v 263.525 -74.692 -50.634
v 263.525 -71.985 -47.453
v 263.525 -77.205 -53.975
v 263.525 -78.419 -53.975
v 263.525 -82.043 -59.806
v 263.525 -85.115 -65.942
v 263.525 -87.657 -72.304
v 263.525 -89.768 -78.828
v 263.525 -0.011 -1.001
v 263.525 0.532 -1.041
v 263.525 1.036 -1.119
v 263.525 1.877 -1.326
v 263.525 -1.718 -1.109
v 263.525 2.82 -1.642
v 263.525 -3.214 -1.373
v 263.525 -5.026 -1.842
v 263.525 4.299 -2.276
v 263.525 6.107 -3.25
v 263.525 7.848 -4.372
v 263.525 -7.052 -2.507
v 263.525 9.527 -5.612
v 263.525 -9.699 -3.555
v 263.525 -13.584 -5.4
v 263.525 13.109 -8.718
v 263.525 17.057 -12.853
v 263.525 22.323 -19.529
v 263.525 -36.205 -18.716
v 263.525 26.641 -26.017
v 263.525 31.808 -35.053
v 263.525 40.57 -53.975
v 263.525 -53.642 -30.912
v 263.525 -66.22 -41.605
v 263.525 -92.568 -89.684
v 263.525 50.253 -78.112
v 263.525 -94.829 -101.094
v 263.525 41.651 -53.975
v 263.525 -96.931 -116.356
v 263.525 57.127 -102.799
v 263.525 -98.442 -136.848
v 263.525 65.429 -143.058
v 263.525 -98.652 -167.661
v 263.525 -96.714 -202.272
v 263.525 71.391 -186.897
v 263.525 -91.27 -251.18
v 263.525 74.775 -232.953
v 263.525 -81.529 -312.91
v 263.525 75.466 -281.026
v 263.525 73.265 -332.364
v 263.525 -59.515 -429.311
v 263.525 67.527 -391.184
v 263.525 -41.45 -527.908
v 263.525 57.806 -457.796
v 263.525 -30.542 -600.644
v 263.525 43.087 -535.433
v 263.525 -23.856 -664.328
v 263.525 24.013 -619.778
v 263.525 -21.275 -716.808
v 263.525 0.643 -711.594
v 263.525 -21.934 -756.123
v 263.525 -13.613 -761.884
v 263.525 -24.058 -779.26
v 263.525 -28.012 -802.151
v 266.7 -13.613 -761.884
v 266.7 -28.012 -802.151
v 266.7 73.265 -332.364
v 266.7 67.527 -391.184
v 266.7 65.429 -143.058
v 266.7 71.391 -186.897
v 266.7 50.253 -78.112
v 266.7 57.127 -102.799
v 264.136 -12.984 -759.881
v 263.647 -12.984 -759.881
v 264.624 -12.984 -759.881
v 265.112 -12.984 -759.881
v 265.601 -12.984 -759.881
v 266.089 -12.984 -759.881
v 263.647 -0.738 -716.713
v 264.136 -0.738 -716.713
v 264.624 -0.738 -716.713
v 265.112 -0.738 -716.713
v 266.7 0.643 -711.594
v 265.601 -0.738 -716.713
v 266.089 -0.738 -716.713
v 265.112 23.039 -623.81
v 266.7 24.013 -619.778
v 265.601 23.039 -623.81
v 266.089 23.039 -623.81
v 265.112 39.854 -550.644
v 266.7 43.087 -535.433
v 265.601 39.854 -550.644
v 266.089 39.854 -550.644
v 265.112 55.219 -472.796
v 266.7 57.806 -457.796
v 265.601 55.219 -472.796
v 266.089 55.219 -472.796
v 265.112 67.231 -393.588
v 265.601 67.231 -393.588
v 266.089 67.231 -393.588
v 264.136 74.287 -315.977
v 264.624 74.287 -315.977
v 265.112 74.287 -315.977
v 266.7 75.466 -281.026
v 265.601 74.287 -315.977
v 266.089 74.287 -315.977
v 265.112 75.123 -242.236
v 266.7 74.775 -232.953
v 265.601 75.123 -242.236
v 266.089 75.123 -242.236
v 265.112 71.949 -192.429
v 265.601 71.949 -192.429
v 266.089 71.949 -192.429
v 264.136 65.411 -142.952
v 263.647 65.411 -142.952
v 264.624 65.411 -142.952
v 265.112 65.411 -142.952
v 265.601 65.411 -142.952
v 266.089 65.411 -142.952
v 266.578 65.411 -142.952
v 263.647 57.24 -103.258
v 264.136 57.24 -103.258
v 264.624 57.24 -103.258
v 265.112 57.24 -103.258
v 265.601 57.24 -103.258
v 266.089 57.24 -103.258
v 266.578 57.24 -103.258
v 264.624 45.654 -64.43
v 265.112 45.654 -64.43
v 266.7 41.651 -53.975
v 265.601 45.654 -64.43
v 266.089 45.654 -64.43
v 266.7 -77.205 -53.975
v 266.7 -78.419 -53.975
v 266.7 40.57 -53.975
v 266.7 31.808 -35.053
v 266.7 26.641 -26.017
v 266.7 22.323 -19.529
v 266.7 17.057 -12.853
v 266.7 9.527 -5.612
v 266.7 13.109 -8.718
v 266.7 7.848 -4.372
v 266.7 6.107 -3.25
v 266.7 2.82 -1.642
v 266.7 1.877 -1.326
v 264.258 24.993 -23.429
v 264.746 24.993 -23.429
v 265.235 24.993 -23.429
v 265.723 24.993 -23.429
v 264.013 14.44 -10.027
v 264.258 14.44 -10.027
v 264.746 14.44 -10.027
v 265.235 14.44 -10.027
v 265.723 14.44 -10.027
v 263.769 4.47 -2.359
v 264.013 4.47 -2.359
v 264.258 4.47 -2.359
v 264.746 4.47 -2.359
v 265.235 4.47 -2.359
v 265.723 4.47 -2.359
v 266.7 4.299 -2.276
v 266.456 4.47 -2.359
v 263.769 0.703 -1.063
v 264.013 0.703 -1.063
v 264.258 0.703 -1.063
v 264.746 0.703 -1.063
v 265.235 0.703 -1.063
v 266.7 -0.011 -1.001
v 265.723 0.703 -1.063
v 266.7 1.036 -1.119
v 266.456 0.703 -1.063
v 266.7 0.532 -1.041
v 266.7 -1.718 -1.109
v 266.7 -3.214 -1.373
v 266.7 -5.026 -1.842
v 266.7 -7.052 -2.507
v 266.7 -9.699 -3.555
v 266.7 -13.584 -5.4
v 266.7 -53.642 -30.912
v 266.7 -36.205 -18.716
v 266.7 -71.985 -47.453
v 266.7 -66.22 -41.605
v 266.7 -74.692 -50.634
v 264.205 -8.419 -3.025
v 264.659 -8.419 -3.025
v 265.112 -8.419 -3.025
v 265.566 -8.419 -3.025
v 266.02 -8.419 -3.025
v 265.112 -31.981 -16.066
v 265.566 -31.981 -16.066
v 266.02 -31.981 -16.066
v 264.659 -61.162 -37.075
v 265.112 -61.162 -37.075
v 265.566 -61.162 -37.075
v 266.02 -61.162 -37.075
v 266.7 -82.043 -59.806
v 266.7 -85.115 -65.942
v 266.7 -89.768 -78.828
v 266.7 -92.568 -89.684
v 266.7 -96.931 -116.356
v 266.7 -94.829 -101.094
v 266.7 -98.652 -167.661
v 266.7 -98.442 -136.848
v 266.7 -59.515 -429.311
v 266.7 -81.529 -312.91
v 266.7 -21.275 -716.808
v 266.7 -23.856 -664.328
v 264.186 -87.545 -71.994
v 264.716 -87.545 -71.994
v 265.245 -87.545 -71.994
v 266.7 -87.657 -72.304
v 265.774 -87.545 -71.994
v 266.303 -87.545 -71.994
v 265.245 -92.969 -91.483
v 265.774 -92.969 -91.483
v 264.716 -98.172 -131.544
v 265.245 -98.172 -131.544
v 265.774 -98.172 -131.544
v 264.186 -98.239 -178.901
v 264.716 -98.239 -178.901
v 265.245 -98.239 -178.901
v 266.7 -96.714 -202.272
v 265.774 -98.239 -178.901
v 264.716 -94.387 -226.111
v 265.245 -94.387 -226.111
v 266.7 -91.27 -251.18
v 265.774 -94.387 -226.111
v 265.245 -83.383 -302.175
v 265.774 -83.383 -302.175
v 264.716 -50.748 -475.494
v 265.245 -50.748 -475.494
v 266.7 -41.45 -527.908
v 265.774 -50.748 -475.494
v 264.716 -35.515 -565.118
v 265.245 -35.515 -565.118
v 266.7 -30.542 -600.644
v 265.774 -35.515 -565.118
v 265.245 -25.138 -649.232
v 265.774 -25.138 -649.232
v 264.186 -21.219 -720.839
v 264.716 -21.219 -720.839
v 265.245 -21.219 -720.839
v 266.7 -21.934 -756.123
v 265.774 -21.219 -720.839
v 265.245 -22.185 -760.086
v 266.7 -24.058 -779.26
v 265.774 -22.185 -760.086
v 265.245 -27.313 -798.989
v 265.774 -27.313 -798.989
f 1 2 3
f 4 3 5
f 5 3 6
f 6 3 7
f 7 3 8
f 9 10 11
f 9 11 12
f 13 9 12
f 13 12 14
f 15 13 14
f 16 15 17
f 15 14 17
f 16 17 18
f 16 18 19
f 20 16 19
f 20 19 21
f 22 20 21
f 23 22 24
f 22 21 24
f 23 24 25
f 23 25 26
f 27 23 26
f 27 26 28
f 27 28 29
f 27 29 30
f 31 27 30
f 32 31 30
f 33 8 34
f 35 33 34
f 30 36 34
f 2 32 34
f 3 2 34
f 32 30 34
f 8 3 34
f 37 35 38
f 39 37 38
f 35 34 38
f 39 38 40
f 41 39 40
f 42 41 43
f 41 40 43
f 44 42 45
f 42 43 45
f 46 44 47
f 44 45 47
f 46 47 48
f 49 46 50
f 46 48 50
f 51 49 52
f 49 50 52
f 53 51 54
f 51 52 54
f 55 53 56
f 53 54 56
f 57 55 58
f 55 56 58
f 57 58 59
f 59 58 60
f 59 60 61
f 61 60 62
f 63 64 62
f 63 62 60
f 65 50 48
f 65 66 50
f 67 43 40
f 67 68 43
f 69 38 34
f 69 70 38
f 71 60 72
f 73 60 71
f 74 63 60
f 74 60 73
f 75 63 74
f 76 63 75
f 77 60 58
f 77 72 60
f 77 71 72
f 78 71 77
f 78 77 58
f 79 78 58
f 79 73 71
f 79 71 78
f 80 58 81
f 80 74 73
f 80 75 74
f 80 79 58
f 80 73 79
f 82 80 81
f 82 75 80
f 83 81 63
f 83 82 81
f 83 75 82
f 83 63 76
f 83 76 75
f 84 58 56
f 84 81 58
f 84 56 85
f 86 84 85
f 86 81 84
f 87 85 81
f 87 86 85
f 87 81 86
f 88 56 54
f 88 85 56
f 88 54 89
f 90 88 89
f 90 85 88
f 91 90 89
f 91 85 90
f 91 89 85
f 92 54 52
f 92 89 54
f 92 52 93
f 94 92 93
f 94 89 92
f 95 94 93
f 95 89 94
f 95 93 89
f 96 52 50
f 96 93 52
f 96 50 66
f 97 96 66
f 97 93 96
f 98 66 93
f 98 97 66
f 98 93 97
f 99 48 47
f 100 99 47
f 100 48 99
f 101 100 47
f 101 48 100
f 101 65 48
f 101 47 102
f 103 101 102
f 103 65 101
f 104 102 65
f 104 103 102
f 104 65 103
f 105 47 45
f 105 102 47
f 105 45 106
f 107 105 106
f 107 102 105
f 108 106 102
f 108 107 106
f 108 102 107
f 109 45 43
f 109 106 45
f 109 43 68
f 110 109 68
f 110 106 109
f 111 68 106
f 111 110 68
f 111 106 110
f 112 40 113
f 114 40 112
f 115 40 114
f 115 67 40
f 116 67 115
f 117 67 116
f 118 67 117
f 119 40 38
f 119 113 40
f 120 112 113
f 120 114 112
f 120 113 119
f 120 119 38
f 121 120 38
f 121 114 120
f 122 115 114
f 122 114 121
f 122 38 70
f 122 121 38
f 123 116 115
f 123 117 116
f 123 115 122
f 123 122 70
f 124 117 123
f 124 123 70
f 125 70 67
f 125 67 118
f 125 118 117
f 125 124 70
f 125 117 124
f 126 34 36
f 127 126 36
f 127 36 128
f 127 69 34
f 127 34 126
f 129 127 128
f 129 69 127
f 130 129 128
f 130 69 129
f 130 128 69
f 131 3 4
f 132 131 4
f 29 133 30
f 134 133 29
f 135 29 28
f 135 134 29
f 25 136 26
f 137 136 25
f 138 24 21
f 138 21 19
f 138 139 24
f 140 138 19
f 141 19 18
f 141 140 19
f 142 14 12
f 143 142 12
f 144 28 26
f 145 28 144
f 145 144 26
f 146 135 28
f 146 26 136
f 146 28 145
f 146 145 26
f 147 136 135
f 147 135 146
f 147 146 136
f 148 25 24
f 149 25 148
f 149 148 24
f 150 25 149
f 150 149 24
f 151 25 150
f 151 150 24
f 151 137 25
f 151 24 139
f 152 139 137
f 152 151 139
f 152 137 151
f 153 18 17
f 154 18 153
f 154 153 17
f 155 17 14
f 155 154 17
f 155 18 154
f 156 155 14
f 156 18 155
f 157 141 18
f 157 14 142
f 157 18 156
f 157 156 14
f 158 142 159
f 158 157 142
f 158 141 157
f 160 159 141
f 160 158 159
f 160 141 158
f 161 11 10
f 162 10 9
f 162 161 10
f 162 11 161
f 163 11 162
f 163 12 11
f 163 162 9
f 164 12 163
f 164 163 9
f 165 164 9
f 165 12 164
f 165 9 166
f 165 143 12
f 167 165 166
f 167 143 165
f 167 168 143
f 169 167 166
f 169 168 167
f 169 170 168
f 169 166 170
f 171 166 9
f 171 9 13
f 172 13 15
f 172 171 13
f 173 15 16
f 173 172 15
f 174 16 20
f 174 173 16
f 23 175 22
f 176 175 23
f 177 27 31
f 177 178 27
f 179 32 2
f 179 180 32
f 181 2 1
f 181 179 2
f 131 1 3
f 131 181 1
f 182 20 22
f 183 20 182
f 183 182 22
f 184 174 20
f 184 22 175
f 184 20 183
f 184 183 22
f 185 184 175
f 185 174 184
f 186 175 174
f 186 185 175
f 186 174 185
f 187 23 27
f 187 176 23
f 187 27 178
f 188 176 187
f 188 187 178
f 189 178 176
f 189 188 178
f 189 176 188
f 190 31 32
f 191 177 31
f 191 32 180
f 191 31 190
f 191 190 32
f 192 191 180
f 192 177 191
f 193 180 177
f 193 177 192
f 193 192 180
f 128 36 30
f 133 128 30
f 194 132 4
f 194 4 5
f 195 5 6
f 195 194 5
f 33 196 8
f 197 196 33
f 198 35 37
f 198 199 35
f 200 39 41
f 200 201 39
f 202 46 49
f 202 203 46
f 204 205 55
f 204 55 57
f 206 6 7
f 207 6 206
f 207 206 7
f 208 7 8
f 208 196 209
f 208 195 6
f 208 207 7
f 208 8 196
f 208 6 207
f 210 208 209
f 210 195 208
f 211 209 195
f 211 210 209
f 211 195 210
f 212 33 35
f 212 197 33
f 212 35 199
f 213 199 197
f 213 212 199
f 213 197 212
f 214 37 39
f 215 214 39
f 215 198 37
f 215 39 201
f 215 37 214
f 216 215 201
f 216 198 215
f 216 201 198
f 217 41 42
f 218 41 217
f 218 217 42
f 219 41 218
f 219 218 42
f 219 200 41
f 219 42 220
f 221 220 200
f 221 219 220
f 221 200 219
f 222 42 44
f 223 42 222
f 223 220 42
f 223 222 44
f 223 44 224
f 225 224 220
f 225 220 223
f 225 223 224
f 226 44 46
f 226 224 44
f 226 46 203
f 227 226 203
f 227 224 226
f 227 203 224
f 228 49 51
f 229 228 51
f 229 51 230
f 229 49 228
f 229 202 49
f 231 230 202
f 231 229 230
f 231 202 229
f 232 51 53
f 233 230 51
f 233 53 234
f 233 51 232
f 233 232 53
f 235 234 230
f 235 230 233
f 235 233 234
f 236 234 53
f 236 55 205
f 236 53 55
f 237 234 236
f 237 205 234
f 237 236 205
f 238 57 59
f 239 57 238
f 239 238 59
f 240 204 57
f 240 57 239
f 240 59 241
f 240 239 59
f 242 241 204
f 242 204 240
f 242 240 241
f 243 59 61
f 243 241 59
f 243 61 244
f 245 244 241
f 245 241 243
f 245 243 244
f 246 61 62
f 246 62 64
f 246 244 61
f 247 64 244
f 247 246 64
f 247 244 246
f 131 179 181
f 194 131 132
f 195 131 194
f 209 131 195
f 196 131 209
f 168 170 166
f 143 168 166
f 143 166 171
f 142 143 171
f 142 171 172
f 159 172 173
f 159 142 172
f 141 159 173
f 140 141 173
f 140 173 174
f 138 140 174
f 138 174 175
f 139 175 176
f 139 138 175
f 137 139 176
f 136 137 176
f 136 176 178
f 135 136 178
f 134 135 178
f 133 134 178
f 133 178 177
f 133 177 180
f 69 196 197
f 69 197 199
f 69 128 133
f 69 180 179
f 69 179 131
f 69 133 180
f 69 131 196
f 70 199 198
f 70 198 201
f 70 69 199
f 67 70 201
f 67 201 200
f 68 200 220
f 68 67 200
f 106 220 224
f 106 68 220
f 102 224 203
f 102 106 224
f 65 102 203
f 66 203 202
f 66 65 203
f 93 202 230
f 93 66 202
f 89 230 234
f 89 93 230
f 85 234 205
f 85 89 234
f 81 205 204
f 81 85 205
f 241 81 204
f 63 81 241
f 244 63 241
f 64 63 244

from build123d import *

# Parameters (mm, degrees)
BOSS_EXTRUDE2_DEPTH = 3.175


with BuildPart() as part:
    # Sketch2 → Boss-Extrude2 (new body)
    with BuildSketch(Plane(origin=(266.7, 0, 0), x_dir=(0, 0, -1), z_dir=(1, 0, 0))):
        with BuildLine():
            Line((53.975, -77.204508027), (53.975, -78.419412207))
            add(Edge.make_bspline(
                [(53.975, -78.419412207), (57.393939715, -80.776121472), (66.842733973, -86.13701714), (84.452765046, -91.717357185), (106.852134498, -96.151510734), (132.510932076, -98.572249175), (161.194365788, -99.092382868), (192.761343292, -97.704243711), (227.038217577, -94.511839296), (263.834756502, -89.663828123), (302.921473177, -83.388445028), (344.017776041, -75.977786804), (386.776799789, -67.780707382), (430.77461487, -59.202323955), (475.496263681, -50.66380512), (520.335279967, -42.603612471), (564.588870456, -35.422796347), (607.4709344, -29.473308084), (648.127538759, -25.014473383), (685.667615873, -22.186241782), (719.196759596, -21.00476141), (747.830287498, -21.278636312), (770.688405743, -22.854711922), (787.091395164, -25.07351564), (796.842303095, -26.819328187), (801.097715575, -27.775140745), (802.151053399, -28.011732033)],
                knots=[0.113056669, 0.113056669, 0.113056669, 0.113056669, 0.127599777, 0.150892793, 0.177565203, 0.207667777, 0.241222088, 0.278203414, 0.318526303, 0.362030579, 0.408464625, 0.457479062, 0.508614437, 0.561296015, 0.614835295, 0.668437534, 0.721214466, 0.772202341, 0.820393483, 0.864765923, 0.904323704, 0.938131581, 0.965241743, 0.984690447, 0.996210442, 1, 1, 1, 1], degree=3))
            add(Edge.make_bspline(
                [(802.151053399, -28.011732033), (801.137231832, -27.710542124), (797.278434829, -26.564156251), (789.357225956, -23.458600593), (777.06146068, -18.643579076), (760.581722214, -13.040064966), (739.99675031, -7.1233282), (715.577161881, -0.379813283), (687.646997389, 7.013021798), (656.683490083, 14.958443735), (623.15891656, 23.258345049), (587.549187868, 31.694376174), (550.31922689, 40.026159278), (511.914813655, 48.001625947), (472.761711337, 55.374538475), (433.262164148, 61.912775617), (393.795881302, 67.404801186), (354.719946084, 71.655180259), (316.356950184, 74.535698451), (278.931254814, 75.753587714), (242.69940893, 75.393823286), (207.870582877, 73.546655951), (174.746776105, 70.258980652), (143.601377813, 65.768183379), (114.762118239, 60.187460639), (88.534490153, 53.628471164), (68.561648347, 47.303164595), (57.431887436, 43.056839639), (53.975, 41.651039403)],
                knots=[0, 0, 0, 0, 0.003802345, 0.014472446, 0.030563625, 0.051299059, 0.07702847, 0.107573811, 0.142399413, 0.180921149, 0.22252468, 0.266590974, 0.312514686, 0.359710118, 0.407632337, 0.455773217, 0.503669018, 0.550900956, 0.597096183, 0.641976048, 0.685511898, 0.727353252, 0.767353583, 0.805169064, 0.840471252, 0.872937278, 0.902335209, 0.915751061, 0.915751061, 0.915751061, 0.915751061], degree=3))
            Line((53.975, 41.651039403), (53.975, 40.570467669))
            add(Edge.make_bspline(
                [(53.975, 40.570467669), (52.223886058, 39.855098624), (46.55545684, 37.466004168), (37.125856967, 33.052667662), (27.830126078, 27.881861429), (20.719091852, 23.242104552), (15.614495512, 19.455137028), (10.786663524, 15.322063664), (6.429543979, 10.752121577), (3.329781232, 6.520651809), (1.766394253, 3.289416468), (1.234579927, 1.629552357), (1.070917704, 0.808496148), (1.022680145, 0.373573872), (1.00777339, 0.114040658), (1.00092143, -0.010571576)],
                knots=[0.916241011, 0.916241011, 0.916241011, 0.916241011, 0.923068013, 0.938443772, 0.953819531, 0.961507411, 0.96919529, 0.97688317, 0.98457105, 0.992258929, 0.996102869, 0.998024839, 0.998985824, 0.999466316, 0.999946809, 0.999946809, 0.999946809, 0.999946809], degree=3))
            add(Edge.make_bspline(
                [(1.00092143, -0.010571576), (1.009923866, -0.277884036), (1.028927427, -0.823363497), (1.102768583, -1.825860344), (1.416760314, -3.597204949), (2.45215177, -7.203197251), (4.557690792, -12.131446446), (7.694252843, -17.87383852), (12.081452023, -25.466401501), (17.732189245, -34.79647061), (24.919919042, -45.768224894), (31.457640354, -54.481000173), (37.047635253, -61.18254607), (42.853610743, -67.720036372), (48.449554365, -73.119796986), (52.936471607, -76.472448044), (53.975, -77.204508027)],
                knots=[5.1727e-05, 5.1727e-05, 5.1727e-05, 5.1727e-05, 0.001013083, 0.00197444, 0.003897153, 0.007742579, 0.015433432, 0.023124285, 0.030815138, 0.046196844, 0.06157855, 0.076960256, 0.084651109, 0.092341962, 0.107723668, 0.112236216, 0.112236216, 0.112236216, 0.112236216], degree=3))
        make_face()
    extrude(amount=-BOSS_EXTRUDE2_DEPTH)


solid = part.part
